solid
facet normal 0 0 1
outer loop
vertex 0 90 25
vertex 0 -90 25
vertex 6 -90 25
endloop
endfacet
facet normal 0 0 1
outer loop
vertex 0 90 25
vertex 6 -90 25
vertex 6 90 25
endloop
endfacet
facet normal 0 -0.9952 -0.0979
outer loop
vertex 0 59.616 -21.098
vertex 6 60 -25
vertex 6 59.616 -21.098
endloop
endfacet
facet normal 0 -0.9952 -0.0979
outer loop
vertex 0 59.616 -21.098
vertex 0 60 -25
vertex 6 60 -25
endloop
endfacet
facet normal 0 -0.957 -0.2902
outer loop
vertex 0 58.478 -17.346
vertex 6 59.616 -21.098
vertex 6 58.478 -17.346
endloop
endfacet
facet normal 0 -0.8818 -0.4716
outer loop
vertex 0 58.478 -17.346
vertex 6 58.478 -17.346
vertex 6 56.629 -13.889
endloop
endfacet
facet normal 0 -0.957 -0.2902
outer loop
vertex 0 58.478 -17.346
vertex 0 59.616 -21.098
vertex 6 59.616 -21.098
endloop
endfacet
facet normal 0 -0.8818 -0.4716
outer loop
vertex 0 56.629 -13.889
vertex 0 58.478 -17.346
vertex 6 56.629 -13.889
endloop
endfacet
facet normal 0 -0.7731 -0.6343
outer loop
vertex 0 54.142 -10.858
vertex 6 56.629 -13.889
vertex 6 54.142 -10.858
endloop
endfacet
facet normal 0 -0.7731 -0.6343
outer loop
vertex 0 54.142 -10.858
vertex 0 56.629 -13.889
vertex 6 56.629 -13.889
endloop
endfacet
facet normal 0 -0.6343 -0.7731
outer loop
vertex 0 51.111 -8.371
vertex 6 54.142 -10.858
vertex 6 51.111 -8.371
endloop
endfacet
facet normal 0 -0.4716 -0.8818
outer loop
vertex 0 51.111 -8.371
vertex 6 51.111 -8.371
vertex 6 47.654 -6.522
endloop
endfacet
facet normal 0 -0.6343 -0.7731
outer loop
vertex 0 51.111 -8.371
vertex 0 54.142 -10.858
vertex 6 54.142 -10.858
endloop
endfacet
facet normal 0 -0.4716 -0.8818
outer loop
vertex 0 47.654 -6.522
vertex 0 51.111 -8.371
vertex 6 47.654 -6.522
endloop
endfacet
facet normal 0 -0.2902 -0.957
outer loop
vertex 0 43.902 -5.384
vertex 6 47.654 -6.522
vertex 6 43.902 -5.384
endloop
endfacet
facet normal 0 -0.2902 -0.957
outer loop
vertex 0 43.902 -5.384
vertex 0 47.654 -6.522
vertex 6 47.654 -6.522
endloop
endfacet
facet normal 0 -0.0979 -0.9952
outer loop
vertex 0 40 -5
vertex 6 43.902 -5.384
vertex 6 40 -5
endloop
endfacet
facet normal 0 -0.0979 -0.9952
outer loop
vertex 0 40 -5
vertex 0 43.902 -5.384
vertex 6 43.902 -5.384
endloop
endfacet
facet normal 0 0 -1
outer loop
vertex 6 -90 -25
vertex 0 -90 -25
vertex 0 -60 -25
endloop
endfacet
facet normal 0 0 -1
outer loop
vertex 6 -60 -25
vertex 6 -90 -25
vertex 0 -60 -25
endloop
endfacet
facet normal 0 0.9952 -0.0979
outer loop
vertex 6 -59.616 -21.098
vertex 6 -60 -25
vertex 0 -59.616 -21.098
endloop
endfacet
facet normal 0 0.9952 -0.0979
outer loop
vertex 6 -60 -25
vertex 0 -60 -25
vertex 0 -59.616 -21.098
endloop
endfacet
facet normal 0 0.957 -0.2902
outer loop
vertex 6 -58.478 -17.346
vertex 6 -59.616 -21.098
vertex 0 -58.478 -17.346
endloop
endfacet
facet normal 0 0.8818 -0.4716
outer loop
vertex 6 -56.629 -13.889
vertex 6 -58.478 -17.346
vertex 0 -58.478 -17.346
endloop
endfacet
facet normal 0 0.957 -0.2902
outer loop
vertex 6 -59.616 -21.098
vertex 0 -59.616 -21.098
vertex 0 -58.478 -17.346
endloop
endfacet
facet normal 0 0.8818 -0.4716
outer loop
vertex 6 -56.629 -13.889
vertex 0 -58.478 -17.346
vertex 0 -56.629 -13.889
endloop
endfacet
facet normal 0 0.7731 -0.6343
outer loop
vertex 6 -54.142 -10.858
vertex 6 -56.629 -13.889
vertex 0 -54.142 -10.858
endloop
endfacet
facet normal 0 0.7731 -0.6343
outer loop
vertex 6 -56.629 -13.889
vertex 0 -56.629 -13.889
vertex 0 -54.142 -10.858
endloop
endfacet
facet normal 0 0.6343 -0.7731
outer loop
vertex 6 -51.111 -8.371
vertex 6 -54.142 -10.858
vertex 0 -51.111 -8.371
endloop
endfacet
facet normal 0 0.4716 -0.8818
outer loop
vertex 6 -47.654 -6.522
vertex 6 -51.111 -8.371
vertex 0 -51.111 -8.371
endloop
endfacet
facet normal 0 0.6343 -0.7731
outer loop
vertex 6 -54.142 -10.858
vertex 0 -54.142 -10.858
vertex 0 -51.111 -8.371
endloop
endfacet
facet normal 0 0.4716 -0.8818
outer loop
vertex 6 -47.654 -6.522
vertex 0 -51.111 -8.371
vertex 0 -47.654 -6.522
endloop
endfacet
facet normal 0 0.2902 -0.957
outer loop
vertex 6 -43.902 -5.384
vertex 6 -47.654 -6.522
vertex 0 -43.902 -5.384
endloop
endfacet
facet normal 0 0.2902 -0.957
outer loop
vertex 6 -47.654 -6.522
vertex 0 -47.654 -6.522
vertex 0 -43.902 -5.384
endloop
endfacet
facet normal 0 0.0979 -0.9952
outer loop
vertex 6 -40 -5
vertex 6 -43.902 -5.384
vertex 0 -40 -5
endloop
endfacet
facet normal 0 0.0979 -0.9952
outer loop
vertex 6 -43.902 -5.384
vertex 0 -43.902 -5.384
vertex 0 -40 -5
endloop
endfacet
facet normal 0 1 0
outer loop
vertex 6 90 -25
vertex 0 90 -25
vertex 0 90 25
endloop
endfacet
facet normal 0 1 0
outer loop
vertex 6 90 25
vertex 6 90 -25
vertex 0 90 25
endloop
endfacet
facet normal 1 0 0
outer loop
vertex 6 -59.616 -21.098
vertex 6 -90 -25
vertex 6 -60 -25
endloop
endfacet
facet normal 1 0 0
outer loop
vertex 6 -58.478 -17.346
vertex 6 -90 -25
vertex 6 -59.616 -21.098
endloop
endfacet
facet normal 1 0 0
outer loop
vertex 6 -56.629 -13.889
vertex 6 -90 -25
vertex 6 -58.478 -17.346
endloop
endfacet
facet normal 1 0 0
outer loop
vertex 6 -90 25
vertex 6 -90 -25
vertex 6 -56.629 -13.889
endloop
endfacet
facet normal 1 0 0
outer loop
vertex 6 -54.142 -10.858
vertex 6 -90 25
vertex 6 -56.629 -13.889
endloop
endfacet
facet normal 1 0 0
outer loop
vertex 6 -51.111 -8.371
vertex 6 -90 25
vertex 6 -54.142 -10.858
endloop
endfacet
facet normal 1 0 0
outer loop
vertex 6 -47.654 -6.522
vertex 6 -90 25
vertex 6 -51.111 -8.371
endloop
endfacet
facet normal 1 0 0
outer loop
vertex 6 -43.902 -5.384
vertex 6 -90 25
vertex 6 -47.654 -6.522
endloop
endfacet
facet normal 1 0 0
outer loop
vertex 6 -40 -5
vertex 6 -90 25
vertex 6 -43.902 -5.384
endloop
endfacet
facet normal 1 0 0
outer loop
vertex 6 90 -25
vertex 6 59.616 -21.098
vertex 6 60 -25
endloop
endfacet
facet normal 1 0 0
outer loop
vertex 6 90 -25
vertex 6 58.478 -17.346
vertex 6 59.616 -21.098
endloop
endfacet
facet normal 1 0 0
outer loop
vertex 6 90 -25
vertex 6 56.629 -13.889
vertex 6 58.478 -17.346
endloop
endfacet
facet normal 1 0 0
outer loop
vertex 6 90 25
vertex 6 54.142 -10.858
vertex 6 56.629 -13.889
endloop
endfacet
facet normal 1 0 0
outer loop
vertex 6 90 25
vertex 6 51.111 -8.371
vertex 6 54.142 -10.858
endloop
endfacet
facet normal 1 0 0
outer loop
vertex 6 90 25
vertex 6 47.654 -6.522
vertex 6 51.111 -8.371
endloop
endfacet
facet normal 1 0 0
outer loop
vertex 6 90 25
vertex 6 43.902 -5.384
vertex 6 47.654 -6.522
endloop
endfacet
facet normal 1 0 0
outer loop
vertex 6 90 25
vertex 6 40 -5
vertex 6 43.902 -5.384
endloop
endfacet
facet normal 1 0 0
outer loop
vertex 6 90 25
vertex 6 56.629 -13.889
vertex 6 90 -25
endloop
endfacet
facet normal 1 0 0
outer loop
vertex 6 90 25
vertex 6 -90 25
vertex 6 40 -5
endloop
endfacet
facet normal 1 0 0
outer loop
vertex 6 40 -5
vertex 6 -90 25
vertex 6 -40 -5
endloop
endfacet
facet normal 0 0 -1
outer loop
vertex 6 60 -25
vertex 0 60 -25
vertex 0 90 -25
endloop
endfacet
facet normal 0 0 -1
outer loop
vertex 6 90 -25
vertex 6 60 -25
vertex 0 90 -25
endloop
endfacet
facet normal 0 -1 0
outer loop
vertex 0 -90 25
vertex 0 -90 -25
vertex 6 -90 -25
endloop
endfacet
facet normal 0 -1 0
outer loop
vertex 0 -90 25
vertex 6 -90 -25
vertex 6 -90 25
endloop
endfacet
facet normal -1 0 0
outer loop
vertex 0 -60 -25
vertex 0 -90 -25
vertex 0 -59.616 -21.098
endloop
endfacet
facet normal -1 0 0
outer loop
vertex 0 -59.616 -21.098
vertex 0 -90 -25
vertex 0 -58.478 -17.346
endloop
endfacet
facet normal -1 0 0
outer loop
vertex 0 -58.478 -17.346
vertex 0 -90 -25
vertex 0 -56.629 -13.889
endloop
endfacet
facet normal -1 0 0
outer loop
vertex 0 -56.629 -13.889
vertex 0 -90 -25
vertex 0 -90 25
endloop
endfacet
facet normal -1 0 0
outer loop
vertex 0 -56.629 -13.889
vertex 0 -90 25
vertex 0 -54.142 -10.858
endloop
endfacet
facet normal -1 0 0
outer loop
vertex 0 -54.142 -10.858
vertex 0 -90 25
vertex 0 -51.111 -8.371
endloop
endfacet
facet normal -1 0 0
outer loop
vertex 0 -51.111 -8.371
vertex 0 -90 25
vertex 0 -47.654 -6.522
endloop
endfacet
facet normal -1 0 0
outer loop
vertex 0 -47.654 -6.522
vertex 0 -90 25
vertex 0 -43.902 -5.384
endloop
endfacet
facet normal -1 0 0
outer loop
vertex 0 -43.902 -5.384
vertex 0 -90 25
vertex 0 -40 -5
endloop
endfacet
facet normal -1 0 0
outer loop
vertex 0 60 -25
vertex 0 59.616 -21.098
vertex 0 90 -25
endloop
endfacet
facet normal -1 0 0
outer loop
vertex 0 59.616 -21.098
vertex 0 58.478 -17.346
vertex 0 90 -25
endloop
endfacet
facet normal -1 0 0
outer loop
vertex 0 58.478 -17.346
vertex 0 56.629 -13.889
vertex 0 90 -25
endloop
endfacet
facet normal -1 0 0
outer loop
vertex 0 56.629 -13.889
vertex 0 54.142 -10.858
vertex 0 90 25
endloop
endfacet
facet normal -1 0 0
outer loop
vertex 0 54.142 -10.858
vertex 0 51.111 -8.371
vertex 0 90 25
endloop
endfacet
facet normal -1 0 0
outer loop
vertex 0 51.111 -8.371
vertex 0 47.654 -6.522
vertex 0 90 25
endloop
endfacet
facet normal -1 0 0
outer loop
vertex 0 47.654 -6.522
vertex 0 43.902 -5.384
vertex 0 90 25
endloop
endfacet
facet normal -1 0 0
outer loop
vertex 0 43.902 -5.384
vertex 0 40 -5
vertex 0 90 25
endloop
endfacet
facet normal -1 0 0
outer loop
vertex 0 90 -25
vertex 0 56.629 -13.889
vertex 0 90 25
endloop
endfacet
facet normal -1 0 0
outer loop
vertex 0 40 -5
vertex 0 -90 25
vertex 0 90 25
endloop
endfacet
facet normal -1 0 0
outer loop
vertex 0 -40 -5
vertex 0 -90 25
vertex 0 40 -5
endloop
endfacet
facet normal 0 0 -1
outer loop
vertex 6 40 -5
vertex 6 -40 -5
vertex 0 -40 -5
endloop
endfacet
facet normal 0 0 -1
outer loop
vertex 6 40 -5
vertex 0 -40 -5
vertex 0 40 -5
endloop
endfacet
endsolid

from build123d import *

# Parameters (mm, degrees)
F0_W     = 180
F0_H     = 50
F1_DEPTH = 6
F2_W     = 120
F2_H     = 20
F3_DEPTH = 25
F4_R     = 19.99999


# Not quite as in the source:
# - a fillet or chamfer is up to 0.001 mm smaller than in the source, because OpenCascade refuses the exact size


with BuildPart() as f1:
    # F0 (on Right) → F1 (new body)
    with BuildSketch(Plane.YZ):
        Rectangle(F0_W, F0_H)
    extrude(amount=F1_DEPTH)

    # F2 (on face) → F3 (cut)
    with BuildSketch(Plane.YZ.offset(6)):
        with Locations((0, -15)):
            Rectangle(F2_W, F2_H)
    extrude(amount=-F3_DEPTH, mode=Mode.SUBTRACT)

    # F4 (radius 20 in the source; OpenCascade refuses exactly that, so slightly less here)
    f4_edges = [f1.edges().sort_by_distance(p)[0] for p in [
        (3, 60, -5),
        (3, -60, -5),
    ]]
    fillet(f4_edges, radius=F4_R)


solid = f1.part
